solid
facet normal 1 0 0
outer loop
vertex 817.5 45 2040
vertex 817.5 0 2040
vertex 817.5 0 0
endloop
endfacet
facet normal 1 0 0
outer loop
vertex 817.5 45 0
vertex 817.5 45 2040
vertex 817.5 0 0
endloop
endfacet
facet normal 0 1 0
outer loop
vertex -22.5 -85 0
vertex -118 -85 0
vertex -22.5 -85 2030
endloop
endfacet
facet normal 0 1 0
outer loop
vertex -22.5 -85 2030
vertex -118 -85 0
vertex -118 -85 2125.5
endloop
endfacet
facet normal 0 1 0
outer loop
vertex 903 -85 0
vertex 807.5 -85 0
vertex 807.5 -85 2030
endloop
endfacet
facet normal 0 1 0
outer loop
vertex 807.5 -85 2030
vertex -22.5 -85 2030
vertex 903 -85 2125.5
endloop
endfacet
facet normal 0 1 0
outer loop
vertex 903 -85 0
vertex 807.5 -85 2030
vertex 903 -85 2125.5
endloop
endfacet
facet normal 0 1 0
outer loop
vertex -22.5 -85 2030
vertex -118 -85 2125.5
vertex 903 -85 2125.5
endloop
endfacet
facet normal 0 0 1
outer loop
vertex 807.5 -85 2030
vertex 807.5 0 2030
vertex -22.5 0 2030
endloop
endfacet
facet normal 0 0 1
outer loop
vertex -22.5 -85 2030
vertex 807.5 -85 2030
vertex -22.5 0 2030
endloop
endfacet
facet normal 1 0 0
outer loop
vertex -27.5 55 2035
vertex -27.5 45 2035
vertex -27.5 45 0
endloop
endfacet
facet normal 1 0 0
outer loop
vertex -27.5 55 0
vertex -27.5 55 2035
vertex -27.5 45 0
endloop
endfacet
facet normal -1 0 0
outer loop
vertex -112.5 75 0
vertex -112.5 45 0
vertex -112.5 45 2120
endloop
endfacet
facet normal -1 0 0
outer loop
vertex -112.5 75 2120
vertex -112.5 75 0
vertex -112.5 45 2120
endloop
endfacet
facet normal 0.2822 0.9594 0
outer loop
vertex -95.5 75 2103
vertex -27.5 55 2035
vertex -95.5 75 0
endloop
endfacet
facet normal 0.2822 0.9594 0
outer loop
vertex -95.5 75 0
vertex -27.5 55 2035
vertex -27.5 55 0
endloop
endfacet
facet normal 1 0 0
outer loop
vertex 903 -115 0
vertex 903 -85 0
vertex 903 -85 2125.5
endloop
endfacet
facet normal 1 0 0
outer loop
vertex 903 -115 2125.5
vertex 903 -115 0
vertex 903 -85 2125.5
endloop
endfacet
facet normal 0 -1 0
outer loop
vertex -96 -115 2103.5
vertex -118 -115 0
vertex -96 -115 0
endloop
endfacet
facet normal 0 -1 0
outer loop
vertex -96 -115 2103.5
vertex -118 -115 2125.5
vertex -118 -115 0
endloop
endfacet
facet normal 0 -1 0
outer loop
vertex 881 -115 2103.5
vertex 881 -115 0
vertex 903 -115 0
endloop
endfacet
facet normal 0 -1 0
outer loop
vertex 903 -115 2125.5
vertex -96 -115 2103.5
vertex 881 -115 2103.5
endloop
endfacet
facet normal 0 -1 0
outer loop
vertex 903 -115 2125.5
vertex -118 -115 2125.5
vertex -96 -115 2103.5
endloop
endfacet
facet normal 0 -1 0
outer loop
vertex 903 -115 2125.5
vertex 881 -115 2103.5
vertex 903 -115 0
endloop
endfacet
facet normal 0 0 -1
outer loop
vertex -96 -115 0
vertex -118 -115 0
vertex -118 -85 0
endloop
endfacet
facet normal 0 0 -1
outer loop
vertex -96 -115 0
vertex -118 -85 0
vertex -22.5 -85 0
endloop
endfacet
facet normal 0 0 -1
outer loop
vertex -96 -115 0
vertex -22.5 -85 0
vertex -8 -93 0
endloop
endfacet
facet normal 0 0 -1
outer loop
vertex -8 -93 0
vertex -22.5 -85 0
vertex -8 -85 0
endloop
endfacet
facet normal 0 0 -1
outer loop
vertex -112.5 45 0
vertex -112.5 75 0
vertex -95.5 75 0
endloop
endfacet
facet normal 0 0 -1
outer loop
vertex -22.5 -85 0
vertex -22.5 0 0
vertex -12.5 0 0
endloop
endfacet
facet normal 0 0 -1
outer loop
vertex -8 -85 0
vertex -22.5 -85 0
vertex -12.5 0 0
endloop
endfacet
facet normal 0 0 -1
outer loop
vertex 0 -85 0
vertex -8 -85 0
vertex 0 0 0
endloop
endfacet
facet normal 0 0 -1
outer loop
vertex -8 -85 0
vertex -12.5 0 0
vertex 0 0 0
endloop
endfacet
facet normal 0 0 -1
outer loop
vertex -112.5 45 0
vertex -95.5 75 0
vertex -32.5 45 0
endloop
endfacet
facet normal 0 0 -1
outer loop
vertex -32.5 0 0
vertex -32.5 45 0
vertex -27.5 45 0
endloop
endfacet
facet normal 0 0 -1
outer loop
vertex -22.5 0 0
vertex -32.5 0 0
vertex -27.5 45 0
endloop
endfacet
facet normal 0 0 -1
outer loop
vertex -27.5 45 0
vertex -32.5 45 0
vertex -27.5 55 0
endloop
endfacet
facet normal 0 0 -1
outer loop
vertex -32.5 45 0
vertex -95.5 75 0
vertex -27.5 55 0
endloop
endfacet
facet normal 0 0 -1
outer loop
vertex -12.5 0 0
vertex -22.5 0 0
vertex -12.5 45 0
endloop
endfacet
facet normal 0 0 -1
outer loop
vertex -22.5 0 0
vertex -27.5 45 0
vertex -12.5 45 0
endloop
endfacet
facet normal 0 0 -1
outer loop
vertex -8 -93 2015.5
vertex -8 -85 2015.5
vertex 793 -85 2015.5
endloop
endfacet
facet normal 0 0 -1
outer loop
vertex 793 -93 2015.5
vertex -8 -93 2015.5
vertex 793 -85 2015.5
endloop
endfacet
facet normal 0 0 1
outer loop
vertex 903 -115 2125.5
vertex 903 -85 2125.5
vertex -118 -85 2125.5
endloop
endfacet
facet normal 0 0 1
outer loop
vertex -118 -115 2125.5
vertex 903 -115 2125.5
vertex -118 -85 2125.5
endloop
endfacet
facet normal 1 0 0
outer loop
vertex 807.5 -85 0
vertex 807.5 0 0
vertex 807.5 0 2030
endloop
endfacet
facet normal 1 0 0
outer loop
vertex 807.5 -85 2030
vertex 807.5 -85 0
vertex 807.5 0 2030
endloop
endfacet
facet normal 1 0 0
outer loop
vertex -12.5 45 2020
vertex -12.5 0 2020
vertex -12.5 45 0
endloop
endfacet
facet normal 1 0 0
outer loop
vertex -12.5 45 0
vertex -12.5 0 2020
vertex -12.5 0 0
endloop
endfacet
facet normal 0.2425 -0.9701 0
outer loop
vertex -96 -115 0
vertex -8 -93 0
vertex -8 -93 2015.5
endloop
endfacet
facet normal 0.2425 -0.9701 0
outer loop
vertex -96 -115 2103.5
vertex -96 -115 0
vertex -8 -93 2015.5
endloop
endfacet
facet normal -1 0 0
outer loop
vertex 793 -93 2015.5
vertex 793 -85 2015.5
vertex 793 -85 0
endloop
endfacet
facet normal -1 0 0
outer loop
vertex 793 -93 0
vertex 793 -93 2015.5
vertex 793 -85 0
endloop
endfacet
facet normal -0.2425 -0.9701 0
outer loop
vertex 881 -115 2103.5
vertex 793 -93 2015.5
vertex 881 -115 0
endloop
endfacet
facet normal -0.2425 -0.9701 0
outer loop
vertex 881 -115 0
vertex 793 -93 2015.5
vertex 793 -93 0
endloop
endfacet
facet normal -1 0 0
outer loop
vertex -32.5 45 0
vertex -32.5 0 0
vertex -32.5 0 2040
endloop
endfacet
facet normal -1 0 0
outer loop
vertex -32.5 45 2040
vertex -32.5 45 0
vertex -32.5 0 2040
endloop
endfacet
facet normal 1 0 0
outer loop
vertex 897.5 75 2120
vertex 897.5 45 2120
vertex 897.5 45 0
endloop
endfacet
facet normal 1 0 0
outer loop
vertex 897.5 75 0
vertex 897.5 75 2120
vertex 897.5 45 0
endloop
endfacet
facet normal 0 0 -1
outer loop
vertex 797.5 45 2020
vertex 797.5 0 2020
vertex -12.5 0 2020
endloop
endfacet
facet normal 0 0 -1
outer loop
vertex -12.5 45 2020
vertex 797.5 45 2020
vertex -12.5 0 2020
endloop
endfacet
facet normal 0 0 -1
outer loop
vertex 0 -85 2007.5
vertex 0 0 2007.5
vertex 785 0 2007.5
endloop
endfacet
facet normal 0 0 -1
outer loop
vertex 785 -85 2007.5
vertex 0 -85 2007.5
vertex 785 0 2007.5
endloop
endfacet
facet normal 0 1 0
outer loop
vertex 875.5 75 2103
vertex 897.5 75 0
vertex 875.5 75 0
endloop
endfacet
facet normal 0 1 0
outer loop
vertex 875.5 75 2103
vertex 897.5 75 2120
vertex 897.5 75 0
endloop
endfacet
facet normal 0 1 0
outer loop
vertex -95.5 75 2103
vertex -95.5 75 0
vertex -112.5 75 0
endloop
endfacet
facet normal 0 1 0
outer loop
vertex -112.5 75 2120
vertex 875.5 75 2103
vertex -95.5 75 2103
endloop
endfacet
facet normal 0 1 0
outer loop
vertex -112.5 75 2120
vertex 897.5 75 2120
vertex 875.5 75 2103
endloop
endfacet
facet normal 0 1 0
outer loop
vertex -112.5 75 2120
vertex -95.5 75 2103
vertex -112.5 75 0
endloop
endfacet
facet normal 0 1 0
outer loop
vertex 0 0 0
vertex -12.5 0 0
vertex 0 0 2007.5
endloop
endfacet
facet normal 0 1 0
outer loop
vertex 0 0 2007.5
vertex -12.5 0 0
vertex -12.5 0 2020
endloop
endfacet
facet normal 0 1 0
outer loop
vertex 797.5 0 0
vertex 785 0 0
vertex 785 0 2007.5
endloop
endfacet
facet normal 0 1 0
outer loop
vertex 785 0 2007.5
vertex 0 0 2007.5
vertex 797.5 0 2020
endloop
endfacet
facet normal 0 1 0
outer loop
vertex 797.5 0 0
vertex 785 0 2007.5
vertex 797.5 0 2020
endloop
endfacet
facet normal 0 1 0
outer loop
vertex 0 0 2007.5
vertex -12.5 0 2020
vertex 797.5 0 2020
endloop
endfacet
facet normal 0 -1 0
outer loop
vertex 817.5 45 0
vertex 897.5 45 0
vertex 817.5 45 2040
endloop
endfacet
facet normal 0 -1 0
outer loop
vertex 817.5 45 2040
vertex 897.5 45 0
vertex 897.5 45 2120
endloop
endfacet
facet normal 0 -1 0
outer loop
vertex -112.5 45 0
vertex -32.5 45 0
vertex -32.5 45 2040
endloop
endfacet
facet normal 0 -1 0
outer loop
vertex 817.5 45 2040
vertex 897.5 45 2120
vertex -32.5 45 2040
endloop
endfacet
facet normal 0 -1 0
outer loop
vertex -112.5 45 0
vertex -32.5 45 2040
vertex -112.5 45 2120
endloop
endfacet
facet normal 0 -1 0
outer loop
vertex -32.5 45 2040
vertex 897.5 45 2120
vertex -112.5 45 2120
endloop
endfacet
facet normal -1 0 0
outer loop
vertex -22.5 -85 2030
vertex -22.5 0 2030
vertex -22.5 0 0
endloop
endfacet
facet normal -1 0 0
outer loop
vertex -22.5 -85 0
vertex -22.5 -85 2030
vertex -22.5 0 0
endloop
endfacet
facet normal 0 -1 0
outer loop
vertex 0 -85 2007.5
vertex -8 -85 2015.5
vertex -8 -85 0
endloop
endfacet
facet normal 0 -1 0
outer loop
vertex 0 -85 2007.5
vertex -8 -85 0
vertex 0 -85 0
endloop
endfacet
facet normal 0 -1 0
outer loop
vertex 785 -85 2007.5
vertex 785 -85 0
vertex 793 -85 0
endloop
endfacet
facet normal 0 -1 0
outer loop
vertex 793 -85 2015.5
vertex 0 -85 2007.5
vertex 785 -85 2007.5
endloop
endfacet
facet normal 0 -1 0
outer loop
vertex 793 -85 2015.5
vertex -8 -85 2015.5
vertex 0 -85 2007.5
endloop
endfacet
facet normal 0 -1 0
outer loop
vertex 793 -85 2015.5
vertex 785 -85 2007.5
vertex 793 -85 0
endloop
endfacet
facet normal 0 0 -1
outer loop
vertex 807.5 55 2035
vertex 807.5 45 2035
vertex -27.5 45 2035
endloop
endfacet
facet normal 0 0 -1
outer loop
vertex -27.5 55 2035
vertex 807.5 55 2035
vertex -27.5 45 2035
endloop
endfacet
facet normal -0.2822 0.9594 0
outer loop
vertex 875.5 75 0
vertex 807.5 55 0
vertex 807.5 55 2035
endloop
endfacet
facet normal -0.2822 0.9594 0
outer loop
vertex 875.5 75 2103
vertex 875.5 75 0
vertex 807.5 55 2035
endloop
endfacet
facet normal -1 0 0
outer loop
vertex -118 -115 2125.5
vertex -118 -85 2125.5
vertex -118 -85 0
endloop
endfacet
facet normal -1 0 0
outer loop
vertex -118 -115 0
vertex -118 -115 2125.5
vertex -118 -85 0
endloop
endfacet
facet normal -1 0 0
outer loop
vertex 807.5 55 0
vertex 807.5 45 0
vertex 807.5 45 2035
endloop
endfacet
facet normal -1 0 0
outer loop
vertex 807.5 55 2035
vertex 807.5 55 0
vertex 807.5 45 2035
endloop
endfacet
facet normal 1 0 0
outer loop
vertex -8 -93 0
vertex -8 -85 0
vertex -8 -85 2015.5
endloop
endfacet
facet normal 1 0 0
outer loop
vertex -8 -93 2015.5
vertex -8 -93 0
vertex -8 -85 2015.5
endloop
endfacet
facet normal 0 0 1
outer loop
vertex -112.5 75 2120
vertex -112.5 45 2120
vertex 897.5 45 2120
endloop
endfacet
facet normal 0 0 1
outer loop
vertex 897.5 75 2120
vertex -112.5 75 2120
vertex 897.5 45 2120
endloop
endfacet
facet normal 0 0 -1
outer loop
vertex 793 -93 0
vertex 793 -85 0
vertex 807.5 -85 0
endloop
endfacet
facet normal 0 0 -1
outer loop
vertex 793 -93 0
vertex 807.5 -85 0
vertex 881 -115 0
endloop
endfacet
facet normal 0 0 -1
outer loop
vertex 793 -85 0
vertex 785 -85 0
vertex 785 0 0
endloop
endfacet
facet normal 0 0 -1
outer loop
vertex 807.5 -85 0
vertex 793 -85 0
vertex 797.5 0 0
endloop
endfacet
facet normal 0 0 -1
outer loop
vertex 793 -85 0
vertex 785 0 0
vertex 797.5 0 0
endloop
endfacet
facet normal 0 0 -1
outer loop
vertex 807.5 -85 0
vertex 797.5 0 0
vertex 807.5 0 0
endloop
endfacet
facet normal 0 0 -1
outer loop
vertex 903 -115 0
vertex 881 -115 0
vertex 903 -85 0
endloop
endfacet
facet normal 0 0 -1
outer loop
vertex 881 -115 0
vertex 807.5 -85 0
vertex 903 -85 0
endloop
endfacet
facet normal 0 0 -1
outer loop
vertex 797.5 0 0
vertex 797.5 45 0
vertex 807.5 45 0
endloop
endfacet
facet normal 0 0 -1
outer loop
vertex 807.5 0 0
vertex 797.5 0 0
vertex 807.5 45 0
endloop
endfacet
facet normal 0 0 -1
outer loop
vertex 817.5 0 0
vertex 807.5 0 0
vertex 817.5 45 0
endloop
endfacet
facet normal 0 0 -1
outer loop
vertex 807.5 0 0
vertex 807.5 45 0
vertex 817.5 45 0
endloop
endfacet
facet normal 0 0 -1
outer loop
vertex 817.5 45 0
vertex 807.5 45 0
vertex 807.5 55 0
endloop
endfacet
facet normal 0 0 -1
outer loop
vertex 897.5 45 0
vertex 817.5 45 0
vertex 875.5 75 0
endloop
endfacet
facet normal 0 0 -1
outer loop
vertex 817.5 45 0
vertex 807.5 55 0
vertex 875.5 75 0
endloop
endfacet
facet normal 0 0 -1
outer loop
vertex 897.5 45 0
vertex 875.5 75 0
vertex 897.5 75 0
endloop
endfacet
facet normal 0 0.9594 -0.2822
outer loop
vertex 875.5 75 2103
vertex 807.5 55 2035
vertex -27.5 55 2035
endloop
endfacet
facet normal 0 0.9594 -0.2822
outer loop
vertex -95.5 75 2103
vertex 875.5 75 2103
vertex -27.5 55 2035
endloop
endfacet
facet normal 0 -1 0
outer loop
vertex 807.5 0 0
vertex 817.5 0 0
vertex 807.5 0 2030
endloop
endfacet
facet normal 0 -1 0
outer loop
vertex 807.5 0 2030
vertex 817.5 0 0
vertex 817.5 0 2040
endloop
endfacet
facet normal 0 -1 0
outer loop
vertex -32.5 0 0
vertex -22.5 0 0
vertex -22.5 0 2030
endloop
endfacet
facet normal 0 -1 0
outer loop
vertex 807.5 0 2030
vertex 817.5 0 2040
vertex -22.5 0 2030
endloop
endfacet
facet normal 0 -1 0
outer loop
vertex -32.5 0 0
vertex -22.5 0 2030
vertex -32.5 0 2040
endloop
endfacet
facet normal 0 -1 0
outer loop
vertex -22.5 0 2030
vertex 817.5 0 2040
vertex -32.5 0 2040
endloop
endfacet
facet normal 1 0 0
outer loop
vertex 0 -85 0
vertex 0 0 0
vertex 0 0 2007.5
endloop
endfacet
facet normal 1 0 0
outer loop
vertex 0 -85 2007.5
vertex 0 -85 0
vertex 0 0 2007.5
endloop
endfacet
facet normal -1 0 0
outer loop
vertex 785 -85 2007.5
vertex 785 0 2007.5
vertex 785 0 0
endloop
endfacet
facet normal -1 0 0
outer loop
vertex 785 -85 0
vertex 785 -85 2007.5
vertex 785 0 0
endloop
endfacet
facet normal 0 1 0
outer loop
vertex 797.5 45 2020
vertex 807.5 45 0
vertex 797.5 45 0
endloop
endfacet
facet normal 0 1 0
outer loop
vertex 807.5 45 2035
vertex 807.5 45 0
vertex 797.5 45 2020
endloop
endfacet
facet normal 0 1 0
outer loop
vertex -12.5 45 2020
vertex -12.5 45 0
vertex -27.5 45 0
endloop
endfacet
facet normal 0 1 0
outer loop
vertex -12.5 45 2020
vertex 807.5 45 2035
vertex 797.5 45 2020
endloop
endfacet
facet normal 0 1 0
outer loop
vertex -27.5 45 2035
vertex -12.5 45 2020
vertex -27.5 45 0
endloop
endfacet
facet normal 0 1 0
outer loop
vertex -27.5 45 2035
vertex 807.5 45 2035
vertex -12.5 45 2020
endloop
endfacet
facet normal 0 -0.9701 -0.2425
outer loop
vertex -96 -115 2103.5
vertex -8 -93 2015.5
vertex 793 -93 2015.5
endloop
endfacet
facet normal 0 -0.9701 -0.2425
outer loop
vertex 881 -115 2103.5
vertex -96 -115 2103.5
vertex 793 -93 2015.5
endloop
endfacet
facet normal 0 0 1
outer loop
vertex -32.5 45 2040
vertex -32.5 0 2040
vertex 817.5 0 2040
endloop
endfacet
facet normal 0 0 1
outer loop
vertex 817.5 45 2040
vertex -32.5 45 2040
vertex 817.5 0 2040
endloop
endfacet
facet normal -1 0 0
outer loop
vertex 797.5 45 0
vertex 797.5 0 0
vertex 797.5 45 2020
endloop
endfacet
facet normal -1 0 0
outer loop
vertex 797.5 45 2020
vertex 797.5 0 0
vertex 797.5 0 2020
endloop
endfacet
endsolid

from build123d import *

# Parameters (mm, degrees)
F1_DEPTH = 85
F3_DEPTH = 45
F5_DEPTH = 30
F6_SIZE2 = 20
F6_SIZE  = 68
F8_DEPTH = 30
F9_SIZE2 = 22
F9_SIZE  = 88


with BuildPart() as f1:
    # F0 (on Front) → F1 (new body)
    with BuildSketch(Plane.XZ):
        Polygon((-22.5, 0), (0, 0), (0, 2007.5), (785, 2007.5), (785, 0), (807.5, 0), (807.5, 2030), (-22.5, 2030), align=None)
    extrude(amount=F1_DEPTH)

    # F2 (on face) → F3 (join)
    with BuildSketch(Plane(origin=(0, 0, 0), x_dir=(-1, 0, 0), z_dir=(0, 1, 0))):
        Polygon((12.5, 0), (22.5, 0), (32.5, 0), (32.5, 2040), (-817.5, 2040), (-817.5, 0), (-807.5, 0), (-797.5, 0), (-797.5, 2020), (12.5, 2020), align=None)
    extrude(amount=F3_DEPTH)

    # F4 (on face) → F5 (join)
    with BuildSketch(Plane(origin=(0, 45, 0), x_dir=(-1, 0, 0), z_dir=(0, 1, 0))):
        Polygon((-897.5, 0), (-817.5, 0), (-807.5, 0), (-807.5, 2035), (27.5, 2035), (27.5, 0), (32.5, 0), (112.5, 0), (112.5, 2120), (-897.5, 2120), align=None)
    extrude(amount=F5_DEPTH)

    # F6
    f6_edges = [f1.edges().sort_by_distance(p)[0] for p in [
        (390, 75, 2035),
        (-27.5, 75, 1017.5),
        (807.5, 75, 1017.5),
    ]]
    f6_side = f1.faces().sort_by_distance((852.5, 75, 23.482973))[0]
    chamfer(f6_edges, length=F6_SIZE, length2=F6_SIZE2, reference=f6_side)

    # F7 (on face) → F8 (join)
    with BuildSketch(Plane.XZ.offset(85)):
        Polygon((-118, 0), (-8, 0), (-8, 2015.5), (793, 2015.5), (793, 0), (903, 0), (903, 2125.5), (-118, 2125.5), align=None)
    extrude(amount=F8_DEPTH)

    # F9
    f9_edges = [f1.edges().sort_by_distance(p)[0] for p in [
        (793, -115, 1007.75),
        (392.5, -115, 2015.5),
        (-8, -115, 1007.75),
    ]]
    f9_side = f1.faces().sort_by_distance((-63, -115, 23.580058))[0]
    chamfer(f9_edges, length=F9_SIZE, length2=F9_SIZE2, reference=f9_side)


solid = f1.part
